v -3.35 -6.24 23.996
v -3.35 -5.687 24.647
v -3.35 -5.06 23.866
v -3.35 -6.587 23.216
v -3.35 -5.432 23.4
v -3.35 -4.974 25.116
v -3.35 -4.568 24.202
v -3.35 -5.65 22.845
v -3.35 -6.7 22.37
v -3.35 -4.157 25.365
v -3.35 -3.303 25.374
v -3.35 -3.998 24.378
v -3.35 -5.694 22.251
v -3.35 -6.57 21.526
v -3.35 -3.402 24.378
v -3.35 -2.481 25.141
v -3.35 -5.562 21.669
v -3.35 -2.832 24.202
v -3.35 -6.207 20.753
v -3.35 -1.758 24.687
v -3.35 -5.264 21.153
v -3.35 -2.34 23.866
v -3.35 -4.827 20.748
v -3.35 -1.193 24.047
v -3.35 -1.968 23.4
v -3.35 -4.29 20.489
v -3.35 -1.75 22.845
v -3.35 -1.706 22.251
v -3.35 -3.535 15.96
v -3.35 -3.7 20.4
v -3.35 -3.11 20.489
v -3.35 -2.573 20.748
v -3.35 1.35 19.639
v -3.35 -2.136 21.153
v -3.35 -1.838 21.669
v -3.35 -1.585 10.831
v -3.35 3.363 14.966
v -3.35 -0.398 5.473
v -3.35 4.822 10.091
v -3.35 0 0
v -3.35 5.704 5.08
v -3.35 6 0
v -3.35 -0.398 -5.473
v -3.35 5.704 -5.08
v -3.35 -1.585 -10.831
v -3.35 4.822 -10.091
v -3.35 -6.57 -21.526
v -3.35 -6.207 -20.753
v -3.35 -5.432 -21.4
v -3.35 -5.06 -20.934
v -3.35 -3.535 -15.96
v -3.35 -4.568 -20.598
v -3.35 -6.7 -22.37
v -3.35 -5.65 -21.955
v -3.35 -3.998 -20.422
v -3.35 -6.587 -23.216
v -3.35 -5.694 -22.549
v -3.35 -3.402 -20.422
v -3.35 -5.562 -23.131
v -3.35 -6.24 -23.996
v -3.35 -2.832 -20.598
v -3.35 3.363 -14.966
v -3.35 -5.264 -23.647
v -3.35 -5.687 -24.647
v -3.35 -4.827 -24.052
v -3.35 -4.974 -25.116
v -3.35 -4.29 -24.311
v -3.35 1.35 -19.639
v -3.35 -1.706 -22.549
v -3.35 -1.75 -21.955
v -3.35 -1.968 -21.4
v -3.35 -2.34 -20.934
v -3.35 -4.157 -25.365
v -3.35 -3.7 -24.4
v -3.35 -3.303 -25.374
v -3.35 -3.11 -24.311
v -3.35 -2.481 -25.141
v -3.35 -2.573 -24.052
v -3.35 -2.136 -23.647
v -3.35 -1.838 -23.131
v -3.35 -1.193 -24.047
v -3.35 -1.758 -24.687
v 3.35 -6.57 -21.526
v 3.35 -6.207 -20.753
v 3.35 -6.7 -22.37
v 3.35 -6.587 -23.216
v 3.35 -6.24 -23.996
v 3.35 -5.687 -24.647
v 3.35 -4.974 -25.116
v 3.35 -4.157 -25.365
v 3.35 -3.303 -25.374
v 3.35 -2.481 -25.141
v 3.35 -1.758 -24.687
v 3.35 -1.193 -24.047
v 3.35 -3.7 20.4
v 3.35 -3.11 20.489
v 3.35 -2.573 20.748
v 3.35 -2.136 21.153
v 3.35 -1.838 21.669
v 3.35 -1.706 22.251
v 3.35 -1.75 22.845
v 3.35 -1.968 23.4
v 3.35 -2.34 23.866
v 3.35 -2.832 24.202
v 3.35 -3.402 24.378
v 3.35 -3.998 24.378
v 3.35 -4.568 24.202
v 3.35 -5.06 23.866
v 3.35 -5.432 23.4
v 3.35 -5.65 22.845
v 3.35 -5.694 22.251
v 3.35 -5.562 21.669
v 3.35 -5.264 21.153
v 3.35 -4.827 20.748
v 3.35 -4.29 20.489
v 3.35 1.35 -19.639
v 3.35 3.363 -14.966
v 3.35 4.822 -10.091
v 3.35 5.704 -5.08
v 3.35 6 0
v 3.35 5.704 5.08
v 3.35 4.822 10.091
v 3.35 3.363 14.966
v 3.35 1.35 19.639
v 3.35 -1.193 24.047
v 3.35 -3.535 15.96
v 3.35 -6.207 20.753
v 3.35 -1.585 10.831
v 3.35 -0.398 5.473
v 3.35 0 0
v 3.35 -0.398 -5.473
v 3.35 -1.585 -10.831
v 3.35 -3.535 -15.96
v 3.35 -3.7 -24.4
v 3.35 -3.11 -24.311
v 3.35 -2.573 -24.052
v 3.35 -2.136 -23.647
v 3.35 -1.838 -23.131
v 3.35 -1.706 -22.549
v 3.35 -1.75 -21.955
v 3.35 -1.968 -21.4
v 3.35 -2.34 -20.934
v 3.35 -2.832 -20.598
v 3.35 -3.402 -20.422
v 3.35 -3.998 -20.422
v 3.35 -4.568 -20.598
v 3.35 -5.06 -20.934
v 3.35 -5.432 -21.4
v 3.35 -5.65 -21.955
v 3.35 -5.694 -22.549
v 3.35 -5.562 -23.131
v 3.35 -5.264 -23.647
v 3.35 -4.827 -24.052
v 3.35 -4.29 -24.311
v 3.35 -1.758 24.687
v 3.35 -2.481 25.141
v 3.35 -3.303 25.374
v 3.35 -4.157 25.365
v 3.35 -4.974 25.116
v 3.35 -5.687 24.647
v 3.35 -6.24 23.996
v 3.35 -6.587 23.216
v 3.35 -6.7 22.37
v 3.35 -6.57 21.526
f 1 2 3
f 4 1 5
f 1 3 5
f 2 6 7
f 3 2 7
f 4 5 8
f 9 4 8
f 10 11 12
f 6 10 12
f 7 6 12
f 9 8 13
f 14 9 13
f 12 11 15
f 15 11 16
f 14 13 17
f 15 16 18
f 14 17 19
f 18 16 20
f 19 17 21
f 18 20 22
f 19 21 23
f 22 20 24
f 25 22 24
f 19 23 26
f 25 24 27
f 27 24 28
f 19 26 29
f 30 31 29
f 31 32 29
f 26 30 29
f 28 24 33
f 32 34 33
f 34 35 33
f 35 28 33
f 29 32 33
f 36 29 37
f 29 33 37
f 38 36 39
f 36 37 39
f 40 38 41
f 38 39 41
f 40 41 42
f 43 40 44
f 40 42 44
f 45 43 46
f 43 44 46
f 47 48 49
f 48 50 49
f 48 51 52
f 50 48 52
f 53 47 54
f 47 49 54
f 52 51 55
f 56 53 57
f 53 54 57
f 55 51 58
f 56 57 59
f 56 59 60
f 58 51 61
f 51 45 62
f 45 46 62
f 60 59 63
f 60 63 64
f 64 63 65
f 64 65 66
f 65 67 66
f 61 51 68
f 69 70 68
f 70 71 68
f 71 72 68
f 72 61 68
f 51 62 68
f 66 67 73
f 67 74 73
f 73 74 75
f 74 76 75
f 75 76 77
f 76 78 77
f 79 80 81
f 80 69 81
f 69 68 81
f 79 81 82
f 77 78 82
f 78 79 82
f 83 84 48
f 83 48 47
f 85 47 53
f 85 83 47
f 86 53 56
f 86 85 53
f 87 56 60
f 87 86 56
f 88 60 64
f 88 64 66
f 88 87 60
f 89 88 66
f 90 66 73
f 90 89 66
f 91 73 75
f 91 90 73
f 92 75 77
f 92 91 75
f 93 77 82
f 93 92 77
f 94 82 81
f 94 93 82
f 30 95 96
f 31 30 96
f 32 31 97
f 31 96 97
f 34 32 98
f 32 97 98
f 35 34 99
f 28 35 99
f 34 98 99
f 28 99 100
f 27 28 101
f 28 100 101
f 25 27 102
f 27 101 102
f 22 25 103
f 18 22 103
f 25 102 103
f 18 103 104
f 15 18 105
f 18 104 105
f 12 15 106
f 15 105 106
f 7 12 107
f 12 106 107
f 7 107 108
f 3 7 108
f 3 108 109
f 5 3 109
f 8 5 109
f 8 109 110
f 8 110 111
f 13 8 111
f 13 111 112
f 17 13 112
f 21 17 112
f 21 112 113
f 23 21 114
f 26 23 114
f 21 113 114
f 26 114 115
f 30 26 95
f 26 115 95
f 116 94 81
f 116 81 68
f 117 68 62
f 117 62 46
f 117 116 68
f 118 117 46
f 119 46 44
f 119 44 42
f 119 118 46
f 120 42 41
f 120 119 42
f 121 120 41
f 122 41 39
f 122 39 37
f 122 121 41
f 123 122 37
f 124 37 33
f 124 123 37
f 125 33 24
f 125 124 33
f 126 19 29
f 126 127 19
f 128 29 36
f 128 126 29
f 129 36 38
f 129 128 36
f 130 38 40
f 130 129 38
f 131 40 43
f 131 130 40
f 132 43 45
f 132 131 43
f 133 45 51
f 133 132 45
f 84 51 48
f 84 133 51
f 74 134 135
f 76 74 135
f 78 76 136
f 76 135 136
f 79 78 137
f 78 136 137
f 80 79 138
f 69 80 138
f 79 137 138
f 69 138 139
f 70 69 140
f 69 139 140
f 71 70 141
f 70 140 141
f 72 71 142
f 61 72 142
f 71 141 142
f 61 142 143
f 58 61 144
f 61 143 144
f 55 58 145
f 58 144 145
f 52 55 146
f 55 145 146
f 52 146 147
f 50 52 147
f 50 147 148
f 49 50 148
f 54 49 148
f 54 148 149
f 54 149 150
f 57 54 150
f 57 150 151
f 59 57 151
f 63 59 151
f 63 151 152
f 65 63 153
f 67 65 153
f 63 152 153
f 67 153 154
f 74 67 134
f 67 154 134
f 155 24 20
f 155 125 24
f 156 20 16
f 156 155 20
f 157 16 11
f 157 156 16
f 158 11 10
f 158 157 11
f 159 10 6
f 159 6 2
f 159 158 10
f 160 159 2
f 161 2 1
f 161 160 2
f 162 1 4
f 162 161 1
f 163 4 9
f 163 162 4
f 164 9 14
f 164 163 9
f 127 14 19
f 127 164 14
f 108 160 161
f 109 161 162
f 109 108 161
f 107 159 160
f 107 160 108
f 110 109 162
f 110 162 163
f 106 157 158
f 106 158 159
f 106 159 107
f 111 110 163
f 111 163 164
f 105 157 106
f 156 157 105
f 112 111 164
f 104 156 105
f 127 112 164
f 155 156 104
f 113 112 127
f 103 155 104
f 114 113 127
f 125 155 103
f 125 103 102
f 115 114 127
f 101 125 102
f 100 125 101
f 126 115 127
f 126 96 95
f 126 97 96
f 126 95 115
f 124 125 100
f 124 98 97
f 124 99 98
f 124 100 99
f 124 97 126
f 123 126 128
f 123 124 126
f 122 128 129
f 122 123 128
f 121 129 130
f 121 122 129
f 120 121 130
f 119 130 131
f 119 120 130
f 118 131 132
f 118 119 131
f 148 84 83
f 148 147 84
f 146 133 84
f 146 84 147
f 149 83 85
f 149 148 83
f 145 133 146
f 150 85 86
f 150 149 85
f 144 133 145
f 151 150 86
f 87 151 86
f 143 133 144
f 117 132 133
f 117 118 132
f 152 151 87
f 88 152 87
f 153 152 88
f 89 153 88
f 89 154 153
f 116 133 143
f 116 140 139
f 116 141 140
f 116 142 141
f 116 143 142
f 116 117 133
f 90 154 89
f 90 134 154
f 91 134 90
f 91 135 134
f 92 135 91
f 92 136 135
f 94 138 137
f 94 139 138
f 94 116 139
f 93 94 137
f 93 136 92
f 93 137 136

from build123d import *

# Parameters (mm, degrees)
BOSS_EXTRUDE1_DEPTH = 3.35
SKETCH2_R           = 2
CUT_EXTRUDE1_DEPTH  = 6.7


with BuildPart() as part:
    # Sketch1 → Boss-Extrude1 (new body, symmetric)
    with BuildSketch(Plane(origin=(0, 0, 0), x_dir=(0, 0, -1), z_dir=(1, 0, 0))):
        with BuildLine():
            ThreePointArc((0, 0), (10.830584713, -1.585060066), (20.752730266, -6.207289856))
            ThreePointArc((20.752730266, -6.207289856), (24.907289856, -5.347269734), (24.047269734, -1.192710144))
            ThreePointArc((24.047269734, -1.192710144), (12.549962758, 4.163308324), (0, 6))
            ThreePointArc((0, 6), (-12.549962758, 4.163308324), (-24.047269734, -1.192710144))
            ThreePointArc((-24.047269734, -1.192710144), (-24.907289856, -5.347269734), (-20.752730266, -6.207289856))
            ThreePointArc((-20.752730266, -6.207289856), (-10.830584713, -1.585060066), (0, 0))
        make_face()
    extrude(amount=BOSS_EXTRUDE1_DEPTH, both=True)

    # Sketch2 → Cut-Extrude1 (cut)
    with BuildSketch(Plane(origin=(3.35, 0, 0), x_dir=(0, 0, -1), z_dir=(1, 0, 0))):
        with Locations((-22.4, -3.7)):
            Circle(SKETCH2_R)
        with Locations((22.4, -3.7)):
            Circle(SKETCH2_R)
    extrude(amount=-CUT_EXTRUDE1_DEPTH, mode=Mode.SUBTRACT)


solid = part.part
